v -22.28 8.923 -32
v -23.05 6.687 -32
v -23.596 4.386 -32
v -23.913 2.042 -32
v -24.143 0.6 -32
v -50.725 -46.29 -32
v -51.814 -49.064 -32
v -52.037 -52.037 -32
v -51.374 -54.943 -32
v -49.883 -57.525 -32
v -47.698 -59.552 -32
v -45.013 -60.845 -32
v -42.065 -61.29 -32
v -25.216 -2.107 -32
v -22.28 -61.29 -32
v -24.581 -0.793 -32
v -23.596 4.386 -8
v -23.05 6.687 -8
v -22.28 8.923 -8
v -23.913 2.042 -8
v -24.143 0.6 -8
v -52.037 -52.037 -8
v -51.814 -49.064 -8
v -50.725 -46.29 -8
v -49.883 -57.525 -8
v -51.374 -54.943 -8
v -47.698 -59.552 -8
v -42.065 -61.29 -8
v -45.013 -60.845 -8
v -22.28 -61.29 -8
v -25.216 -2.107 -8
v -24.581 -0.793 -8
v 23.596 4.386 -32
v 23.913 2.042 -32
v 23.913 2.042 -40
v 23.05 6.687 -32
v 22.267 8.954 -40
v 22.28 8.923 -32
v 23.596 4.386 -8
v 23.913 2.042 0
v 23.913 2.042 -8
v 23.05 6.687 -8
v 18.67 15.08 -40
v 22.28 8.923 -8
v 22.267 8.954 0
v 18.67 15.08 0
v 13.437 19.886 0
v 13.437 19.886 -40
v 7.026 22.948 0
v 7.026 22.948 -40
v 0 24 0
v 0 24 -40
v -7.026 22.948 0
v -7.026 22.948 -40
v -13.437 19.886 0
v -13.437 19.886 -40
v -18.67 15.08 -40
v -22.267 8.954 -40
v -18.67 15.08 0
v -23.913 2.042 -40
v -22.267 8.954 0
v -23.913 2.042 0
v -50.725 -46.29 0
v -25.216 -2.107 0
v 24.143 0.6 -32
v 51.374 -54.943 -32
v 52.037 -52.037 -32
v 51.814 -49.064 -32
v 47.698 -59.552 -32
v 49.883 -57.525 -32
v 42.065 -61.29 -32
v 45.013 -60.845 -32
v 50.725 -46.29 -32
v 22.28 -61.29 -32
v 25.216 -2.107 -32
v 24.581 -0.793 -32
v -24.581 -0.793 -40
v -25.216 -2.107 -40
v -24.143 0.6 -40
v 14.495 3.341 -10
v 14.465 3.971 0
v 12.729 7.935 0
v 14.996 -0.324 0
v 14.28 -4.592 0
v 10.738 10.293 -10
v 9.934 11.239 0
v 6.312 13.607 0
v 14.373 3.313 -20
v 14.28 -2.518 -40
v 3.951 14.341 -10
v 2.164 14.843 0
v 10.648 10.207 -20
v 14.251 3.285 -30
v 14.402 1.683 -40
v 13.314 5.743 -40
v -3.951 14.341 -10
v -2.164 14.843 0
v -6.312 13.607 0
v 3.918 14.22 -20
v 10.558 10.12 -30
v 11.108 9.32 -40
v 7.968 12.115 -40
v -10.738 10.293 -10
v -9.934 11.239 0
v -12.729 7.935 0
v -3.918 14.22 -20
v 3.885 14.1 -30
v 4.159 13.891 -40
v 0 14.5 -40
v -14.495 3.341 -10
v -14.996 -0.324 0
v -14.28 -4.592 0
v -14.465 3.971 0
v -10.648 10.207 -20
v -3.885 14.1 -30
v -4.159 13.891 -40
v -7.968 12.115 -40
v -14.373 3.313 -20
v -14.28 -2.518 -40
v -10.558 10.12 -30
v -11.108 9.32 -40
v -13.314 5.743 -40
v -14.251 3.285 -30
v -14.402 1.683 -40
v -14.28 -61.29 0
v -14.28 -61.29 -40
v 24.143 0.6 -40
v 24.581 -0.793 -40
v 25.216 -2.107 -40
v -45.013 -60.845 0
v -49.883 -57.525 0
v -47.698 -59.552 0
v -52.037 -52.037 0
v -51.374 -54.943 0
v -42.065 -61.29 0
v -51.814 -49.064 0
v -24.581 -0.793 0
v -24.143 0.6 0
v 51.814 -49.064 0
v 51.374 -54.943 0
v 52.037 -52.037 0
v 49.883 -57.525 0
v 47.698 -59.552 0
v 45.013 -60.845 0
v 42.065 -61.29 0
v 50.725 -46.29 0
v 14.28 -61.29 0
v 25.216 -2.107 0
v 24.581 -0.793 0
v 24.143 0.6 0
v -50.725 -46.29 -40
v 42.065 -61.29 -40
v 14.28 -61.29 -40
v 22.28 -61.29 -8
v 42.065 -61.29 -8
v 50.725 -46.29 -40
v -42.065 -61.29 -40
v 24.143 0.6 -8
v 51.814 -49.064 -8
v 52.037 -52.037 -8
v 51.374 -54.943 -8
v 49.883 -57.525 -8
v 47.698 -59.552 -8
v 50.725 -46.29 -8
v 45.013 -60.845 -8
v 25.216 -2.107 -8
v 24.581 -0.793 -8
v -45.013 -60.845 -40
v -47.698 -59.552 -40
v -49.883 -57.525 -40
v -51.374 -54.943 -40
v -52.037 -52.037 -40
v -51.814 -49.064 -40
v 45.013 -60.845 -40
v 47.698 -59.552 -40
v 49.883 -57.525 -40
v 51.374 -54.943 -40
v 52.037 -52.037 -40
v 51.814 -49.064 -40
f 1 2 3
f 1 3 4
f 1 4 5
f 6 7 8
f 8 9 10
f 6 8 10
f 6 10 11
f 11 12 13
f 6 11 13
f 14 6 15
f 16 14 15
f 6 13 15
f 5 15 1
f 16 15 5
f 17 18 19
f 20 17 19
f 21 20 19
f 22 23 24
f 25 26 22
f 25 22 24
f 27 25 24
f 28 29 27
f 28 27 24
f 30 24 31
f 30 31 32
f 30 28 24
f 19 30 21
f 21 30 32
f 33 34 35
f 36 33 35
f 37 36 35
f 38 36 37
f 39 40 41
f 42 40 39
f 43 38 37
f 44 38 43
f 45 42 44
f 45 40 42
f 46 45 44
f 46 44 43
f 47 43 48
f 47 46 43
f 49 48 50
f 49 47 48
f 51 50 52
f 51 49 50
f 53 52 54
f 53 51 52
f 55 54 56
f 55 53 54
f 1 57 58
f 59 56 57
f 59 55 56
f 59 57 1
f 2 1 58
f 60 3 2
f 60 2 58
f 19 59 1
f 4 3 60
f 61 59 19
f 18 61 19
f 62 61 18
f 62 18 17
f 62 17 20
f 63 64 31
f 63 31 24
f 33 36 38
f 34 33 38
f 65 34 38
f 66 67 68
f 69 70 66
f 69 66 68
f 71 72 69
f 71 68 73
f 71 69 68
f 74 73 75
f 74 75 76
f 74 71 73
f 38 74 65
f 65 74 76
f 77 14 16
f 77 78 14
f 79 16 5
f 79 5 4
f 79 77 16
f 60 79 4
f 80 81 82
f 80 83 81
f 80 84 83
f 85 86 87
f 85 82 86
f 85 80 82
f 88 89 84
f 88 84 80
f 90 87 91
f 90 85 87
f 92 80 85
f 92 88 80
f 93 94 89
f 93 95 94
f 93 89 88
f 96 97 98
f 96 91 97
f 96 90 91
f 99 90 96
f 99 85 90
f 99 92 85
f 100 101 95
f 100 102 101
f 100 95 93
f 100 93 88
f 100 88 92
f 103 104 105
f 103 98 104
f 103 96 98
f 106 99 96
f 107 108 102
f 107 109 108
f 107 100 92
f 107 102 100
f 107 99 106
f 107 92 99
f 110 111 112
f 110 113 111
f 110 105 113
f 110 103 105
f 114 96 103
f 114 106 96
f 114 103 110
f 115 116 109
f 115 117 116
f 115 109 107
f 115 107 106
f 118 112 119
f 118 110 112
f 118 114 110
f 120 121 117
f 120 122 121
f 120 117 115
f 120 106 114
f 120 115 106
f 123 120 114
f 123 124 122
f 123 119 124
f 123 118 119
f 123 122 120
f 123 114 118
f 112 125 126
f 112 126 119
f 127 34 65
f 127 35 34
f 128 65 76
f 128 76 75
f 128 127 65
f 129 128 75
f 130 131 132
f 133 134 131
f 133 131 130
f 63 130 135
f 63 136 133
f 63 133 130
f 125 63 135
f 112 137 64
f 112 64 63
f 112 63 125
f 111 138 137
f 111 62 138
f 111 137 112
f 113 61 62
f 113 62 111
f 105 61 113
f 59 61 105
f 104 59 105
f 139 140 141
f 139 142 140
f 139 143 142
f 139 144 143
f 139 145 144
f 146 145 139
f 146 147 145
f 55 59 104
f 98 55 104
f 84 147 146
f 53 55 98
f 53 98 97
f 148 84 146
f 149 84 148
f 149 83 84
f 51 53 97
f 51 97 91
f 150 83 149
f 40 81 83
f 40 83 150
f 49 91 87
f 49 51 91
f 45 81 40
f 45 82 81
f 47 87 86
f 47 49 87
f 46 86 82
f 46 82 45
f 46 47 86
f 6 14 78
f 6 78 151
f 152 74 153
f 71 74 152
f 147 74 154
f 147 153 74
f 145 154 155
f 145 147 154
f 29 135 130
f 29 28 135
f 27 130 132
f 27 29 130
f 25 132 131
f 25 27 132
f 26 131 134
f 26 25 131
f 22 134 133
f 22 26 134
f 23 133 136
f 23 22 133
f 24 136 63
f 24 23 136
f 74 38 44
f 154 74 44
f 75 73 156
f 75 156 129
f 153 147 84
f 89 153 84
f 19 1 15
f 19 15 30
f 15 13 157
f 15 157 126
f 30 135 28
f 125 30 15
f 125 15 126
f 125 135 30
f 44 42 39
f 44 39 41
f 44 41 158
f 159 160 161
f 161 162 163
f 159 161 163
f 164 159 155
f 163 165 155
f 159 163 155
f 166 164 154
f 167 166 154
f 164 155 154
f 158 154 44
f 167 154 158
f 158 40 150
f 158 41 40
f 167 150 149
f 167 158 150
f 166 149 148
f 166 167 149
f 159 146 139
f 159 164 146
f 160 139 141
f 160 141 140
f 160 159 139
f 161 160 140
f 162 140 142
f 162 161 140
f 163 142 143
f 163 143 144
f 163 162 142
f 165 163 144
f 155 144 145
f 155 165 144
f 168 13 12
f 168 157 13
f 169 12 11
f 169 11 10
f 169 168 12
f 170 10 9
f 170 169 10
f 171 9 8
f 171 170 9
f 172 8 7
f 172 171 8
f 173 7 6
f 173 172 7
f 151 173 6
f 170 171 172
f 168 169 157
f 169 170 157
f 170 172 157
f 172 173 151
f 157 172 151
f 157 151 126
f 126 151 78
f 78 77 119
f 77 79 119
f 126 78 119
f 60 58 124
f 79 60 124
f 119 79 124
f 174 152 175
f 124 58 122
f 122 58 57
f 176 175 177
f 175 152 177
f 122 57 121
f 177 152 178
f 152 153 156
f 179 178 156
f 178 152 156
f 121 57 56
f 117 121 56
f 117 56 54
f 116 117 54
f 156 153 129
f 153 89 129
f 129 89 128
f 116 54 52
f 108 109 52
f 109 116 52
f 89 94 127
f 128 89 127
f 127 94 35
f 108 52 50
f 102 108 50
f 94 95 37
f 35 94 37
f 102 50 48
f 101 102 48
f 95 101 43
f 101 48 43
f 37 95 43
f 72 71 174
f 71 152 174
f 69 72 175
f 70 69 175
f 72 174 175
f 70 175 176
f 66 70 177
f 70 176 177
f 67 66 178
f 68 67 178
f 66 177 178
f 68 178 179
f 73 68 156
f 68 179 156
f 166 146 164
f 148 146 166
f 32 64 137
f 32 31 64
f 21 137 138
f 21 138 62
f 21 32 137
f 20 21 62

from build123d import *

# Parameters (mm, degrees)
F3_R      = 24
F4_DEPTH  = 40
F0_R      = 15
F2_R      = 14.5
F7_DEPTH  = 40.0010001
F9_DEPTH  = 40
F10_W     = 37.1058717763
F10_H     = 24
F11_DEPTH = 85.2906296813
F12_R     = 10
F13_R     = 10


# Not quite as in the source:
# - a pattern or mirror of a feature is missing from the dataset's text; its kind, count and spacing are read off the source's solid


with BuildPart() as f4:
    # F3 (on Top) → F4 (new body)
    with BuildSketch(Plane.XY):
        Circle(F3_R)
    extrude(amount=-F4_DEPTH)

    # F0 (on Top) → F5 section 0
    with BuildSketch(Plane.XY):
        Circle(F0_R)
    # F2 (on offset) → F5 section 1
    with BuildSketch(Plane.XY.offset(-40)):
        Circle(F2_R)
    loft(mode=Mode.SUBTRACT)

    # F6 (on face) → F7 (cut, through all)
    with BuildSketch(Plane.XY):
        with BuildLine():
            Line((-14.2797124187, -4.5923646676), (-14.2797124187, -19.2896296813))
            ThreePointArc((-14.2797124187, -19.2896296813), (0, -24), (14.2797124187, -19.2896296813))
            Line((14.2797124187, -19.2896296813), (14.2797124187, -4.5923646676))
            ThreePointArc((14.2797124187, -4.5923646676), (0, -15), (-14.2797124187, -4.5923646676))
        make_face()
        with BuildLine():
            Line((-14.2797124187, -2.5178985762), (-14.2797124187, -4.5923646676))
            ThreePointArc((-14.2797124187, -4.5923646676), (0, -15), (14.2797124187, -4.5923646676))
            Line((14.2797124187, -4.5923646676), (14.2797124187, -2.5178985762))
            ThreePointArc((14.2797124187, -2.5178985762), (0, -14.5), (-14.2797124187, -2.5178985762))
        make_face()
    extrude(amount=-F7_DEPTH, mode=Mode.SUBTRACT)

    # F8 (on face) → F9 (join)
    with BuildSketch(Plane.XY):
        with BuildLine():
            Line((-14.2797124187, -61.2896296813), (-14.2797124187, -19.2896296813))
            ThreePointArc((-14.2797124187, -19.2896296813), (-21.4326048119, -10.8001597662), (-24, 0))
            Line((-24, 0), (-59.385584195, -61.2896296813))
            Line((-59.385584195, -61.2896296813), (-14.2797124187, -61.2896296813))
        make_face()
        with BuildLine():
            ThreePointArc((24, 0), (21.4326048119, -10.8001597662), (14.2797124187, -19.2896296813))
            Line((14.2797124187, -19.2896296813), (14.2797124187, -61.2896296813))
            Line((14.2797124187, -61.2896296813), (59.385584195, -61.2896296813))
            Line((59.385584195, -61.2896296813), (24, 0))
        make_face()
    extrude(amount=-F9_DEPTH)

    # F10 (on face) → F11 (cut, through all)
    with BuildSketch(Plane.XZ.offset(61.2896296813)):
        with Locations((-40.8326483068, -20)):
            Rectangle(F10_W, F10_H)
    f11 = extrude(amount=-F11_DEPTH, mode=Mode.SUBTRACT)

    # F11_copies: F11 across plane
    add(f11.mirror(Plane(origin=(0, 0, 0), x_dir=(0, 0, 1), z_dir=(1, 0, 0))), mode=Mode.SUBTRACT)

    # F12
    f12_edges = [f4.edges().sort_by_distance(p)[0] for p in [
        (-59.385584, -61.28963, -4),
        (-59.385584, -61.28963, -36),
        (-24, 0, -4),
        (-24, 0, -36),
    ]]
    fillet(f12_edges, radius=F12_R)

    # F13
    f13_edges = [f4.edges().sort_by_distance(p)[0] for p in [
        (59.385584, -61.28963, -4),
        (59.385584, -61.28963, -36),
        (24, 0, -4),
        (24, 0, -36),
    ]]
    fillet(f13_edges, radius=F13_R)


solid = f4.part
